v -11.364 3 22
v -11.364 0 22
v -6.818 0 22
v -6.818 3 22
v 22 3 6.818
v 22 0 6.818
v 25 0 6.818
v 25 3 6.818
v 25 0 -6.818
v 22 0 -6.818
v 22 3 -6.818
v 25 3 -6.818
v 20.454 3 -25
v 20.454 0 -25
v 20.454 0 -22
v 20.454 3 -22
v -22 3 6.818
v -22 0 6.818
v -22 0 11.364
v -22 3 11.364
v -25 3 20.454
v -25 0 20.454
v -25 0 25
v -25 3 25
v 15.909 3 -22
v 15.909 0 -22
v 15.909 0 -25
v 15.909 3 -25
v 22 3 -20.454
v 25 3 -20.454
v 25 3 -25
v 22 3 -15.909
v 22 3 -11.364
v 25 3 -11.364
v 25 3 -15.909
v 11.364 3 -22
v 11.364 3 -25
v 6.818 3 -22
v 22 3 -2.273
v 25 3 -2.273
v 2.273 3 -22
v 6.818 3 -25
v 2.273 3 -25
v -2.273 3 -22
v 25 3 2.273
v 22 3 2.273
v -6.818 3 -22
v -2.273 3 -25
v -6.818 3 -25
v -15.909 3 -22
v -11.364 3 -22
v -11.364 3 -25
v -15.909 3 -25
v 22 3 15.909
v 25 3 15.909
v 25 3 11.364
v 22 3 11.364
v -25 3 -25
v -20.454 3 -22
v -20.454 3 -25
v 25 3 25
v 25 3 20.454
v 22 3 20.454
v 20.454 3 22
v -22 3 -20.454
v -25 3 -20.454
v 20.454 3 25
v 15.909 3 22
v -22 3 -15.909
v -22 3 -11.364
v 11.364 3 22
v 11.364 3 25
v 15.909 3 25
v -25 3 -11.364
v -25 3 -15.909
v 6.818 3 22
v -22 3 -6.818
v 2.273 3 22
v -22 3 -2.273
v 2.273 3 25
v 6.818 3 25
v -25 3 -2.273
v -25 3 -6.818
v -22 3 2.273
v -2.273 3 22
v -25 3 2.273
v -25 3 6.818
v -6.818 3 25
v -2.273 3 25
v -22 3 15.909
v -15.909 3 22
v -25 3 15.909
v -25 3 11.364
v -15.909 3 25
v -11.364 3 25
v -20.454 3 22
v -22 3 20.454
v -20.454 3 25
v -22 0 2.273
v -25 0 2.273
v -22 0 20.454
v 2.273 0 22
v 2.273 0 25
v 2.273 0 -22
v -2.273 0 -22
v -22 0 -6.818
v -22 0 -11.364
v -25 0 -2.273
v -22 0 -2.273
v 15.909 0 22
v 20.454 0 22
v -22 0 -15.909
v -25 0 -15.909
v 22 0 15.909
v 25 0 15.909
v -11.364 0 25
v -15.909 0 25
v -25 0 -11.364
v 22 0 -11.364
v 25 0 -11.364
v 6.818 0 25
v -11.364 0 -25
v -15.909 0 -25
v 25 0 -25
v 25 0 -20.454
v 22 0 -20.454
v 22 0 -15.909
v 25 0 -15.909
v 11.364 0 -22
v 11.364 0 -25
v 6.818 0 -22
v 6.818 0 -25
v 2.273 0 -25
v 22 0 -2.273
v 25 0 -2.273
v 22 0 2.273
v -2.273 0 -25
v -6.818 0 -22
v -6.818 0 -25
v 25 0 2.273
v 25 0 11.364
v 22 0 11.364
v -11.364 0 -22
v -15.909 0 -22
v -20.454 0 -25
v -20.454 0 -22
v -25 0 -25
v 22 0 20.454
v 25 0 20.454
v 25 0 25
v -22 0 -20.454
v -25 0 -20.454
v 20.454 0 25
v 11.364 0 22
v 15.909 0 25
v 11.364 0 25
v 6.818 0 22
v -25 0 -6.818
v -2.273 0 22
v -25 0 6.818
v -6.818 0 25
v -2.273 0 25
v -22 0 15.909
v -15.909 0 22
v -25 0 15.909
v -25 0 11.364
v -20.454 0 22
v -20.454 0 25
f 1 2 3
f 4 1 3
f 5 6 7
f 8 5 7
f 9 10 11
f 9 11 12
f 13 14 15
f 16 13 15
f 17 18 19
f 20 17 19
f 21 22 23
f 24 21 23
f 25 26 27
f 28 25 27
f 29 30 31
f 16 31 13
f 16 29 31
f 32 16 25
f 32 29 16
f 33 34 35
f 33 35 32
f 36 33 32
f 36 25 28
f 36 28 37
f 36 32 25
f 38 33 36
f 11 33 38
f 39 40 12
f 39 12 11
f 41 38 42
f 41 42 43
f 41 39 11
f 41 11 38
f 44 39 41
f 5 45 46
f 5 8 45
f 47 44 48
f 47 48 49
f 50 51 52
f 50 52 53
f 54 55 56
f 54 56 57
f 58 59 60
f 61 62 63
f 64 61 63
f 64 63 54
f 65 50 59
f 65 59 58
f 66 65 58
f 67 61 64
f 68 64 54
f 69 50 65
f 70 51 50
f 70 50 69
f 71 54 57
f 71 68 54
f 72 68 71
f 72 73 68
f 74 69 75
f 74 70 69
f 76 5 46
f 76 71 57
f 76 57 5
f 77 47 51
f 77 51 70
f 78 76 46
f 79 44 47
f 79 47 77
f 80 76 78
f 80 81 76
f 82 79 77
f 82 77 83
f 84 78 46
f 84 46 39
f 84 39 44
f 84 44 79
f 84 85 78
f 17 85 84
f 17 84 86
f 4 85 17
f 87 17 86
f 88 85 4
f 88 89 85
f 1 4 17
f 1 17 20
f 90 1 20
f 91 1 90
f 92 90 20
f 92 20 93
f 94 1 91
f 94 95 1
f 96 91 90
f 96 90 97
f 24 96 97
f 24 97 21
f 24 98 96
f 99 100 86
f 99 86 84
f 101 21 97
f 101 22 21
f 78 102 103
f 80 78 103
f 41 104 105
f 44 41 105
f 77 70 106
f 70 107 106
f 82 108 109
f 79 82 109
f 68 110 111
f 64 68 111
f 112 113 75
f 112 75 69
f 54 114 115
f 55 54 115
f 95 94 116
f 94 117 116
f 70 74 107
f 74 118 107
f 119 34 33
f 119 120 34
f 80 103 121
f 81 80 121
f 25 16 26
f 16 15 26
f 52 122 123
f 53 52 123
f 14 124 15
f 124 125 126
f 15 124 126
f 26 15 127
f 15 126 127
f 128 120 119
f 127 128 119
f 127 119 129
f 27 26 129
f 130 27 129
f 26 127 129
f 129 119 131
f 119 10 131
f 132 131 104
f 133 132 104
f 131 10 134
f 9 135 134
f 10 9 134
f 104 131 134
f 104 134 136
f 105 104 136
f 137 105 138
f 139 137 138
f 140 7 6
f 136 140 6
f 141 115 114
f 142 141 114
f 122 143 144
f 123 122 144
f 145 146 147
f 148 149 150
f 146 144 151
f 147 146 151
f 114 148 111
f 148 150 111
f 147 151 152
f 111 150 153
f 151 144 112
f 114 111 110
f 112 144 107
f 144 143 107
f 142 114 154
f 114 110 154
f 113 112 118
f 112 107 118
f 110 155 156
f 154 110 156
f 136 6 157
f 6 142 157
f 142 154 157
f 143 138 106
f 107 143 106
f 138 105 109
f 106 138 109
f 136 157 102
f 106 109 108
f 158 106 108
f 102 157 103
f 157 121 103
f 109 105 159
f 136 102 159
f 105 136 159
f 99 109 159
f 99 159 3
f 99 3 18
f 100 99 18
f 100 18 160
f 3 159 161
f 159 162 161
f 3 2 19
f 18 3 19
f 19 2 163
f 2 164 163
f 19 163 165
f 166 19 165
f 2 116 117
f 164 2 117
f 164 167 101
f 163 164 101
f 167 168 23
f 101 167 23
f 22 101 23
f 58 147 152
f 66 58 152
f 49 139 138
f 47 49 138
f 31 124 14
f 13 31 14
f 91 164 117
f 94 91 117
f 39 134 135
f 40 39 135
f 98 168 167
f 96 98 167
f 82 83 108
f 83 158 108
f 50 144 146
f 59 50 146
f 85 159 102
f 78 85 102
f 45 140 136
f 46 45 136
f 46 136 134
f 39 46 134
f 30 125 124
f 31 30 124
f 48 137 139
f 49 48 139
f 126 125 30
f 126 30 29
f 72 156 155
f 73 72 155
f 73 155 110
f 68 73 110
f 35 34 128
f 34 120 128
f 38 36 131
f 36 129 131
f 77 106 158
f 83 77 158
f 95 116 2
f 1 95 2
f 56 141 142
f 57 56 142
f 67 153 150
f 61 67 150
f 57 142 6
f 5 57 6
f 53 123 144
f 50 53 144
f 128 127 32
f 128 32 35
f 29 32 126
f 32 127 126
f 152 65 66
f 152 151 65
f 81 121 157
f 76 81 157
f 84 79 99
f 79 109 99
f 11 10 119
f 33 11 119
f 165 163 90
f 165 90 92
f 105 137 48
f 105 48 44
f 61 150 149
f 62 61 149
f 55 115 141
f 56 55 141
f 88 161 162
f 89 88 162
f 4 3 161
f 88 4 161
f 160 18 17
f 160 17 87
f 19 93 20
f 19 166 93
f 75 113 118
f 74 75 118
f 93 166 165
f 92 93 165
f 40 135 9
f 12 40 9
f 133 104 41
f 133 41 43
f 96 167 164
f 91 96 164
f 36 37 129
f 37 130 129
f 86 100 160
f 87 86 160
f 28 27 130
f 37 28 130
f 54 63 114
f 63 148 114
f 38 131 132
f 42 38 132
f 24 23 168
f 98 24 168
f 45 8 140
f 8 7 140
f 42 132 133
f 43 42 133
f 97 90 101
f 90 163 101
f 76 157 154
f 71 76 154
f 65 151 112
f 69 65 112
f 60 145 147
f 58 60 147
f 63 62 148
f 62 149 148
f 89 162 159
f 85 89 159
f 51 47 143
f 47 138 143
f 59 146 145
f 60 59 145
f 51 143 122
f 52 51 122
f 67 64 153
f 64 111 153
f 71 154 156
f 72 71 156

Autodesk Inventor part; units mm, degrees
ref_plane "YZ Plane" through (0, 0, 0) normal (1, 0, 0) x (0, 1, 0)
ref_plane "XZ Plane" through (0, 0, 0) normal (0, 1, 0) x (-1, 0, 0)
ref_plane "XY Plane" through (0, 0, 0) normal (0, 0, 1) x (1, 0, 0)
sketch "Sketch1" plane through (0, 0, 0) normal (0, 1, 0) x (-1, 0, 0)
  line L0 (20.4545, 25) -> (20.4545, 22)
  line L1 (15.9091, 22) -> (15.9091, 25)
  line L2 (11.3636, 25) -> (11.3636, 22)
  line L3 (6.8182, 22) -> (6.8182, 25)
  line L4 (2.2727, 25) -> (2.2727, 22)
  line L5 (-2.2727, 22) -> (-2.2727, 25)
  line L6 (-6.8182, 25) -> (-6.8182, 22)
  line L7 (-11.3636, 22) -> (-11.3636, 25)
  line L8 (-15.9091, 25) -> (-15.9091, 22)
  line L9 (-20.4545, 22) -> (-20.4545, 25)
  line L10 (-25, 20.4545) -> (-22, 20.4545)
  line L11 (-22, 15.9091) -> (-25, 15.9091)
  line L12 (-25, 11.3636) -> (-22, 11.3636)
  line L13 (-22, 6.8182) -> (-25, 6.8182)
  line L14 (-25, 2.2727) -> (-22, 2.2727)
  line L15 (-22, -2.2727) -> (-25, -2.2727)
  line L16 (-22, -6.8182) -> (-25, -6.8182)
  line L17 (-25, -11.3636) -> (-22, -11.3636)
  line L18 (-22, -15.9091) -> (-25, -15.9091)
  line L19 (-25, -20.4545) -> (-22, -20.4545)
  line L20 (-20.4545, -25) -> (-20.4545, -22)
  line L21 (-15.9091, -22) -> (-15.9091, -25)
  line L22 (-11.3636, -25) -> (-11.3636, -22)
  line L23 (-6.8182, -22) -> (-6.8182, -25)
  line L24 (-2.2727, -22) -> (-2.2727, -25)
  line L25 (2.2727, -25) -> (2.2727, -22)
  line L26 (20.4545, -22) -> (20.4545, -25)
  line L27 (15.9091, -25) -> (15.9091, -22)
  line L28 (11.3636, -22) -> (11.3636, -25)
  line L29 (6.8182, -25) -> (6.8182, -22)
  line L30 (22, -20.4545) -> (25, -20.4545)
  line L31 (25, -15.9091) -> (22, -15.9091)
  line L32 (25, -11.3636) -> (22, -11.3636)
  line L33 (25, -2.2727) -> (22, -2.2727)
  line L34 (25, 2.2727) -> (22, 2.2727)
  line L35 (25, 20.4545) -> (22, 20.4545)
  line L36 (22, 15.9091) -> (25, 15.9091)
  line L37 (25, 11.3636) -> (22, 11.3636)
  line L38 (22, 6.8182) -> (25, 6.8182)
  line L39 (15.9091, -22) -> (20.4545, -22)
  line L40 (6.8182, -22) -> (11.3636, -22)
  line L41 (-2.2727, -22) -> (2.2727, -22)
  line L42 (22, -20.4545) -> (22, -15.9091)
  line L43 (22, -2.2727) -> (22, 2.2727)
  line L44 (22, 6.8182) -> (22, 11.3636)
  line L45 (22, 15.9091) -> (22, 20.4545)
  line L46 (20.4545, 22) -> (15.9091, 22)
  line L47 (11.3636, 22) -> (6.8182, 22)
  line L48 (2.2727, 22) -> (-2.2727, 22)
  line L49 (-6.8182, 22) -> (-11.3636, 22)
  line L50 (-15.9091, 22) -> (-20.4545, 22)
  line L51 (-22, 20.4545) -> (-22, 15.9091)
  line L52 (-22, 11.3636) -> (-22, 6.8182)
  line L53 (-22, 2.2727) -> (-22, -2.2727)
  line L54 (-25, 6.8182) -> (-25, 2.2727)
  line L55 (-25, 25) -> (-25, 20.4545)
  line L56 (-25, 15.9091) -> (-25, 11.3636)
  line L57 (-20.4545, -22) -> (-15.9091, -22)
  line L58 (-11.3636, -22) -> (-6.8182, -22)
  line L59 (-22, -6.8182) -> (-22, -11.3636)
  line L60 (-22, -15.9091) -> (-22, -20.4545)
  line L61 (-25, -2.2727) -> (-25, -6.8182)
  line L62 (-25, -11.3636) -> (-25, -15.9091)
  line L63 (-25, -20.4545) -> (-25, -25)
  line L64 (-25, -25) -> (-20.4545, -25)
  line L65 (-15.9091, -25) -> (-11.3636, -25)
  line L66 (-6.8182, -25) -> (-2.2727, -25)
  line L67 (2.2727, -25) -> (6.8182, -25)
  line L68 (11.3636, -25) -> (15.9091, -25)
  line L69 (20.4545, -25) -> (25, -25)
  line L70 (25, -25) -> (25, -20.4545)
  line L71 (25, 2.2727) -> (25, 6.8182)
  line L72 (25, 11.3636) -> (25, 15.9091)
  line L73 (25, 20.4545) -> (25, 25)
  line L74 (25, 25) -> (20.4545, 25)
  line L75 (15.9091, 25) -> (11.3636, 25)
  line L76 (6.8182, 25) -> (2.2727, 25)
  line L77 (-2.2727, 25) -> (-6.8182, 25)
  line L78 (-11.3636, 25) -> (-15.9091, 25)
  line L79 (-20.4545, 25) -> (-25, 25)
  line L80 (22, -11.3636) -> (22, -6.8182)
  line L81 (22, -6.8182) -> (25, -6.8182)
  line L82 (25, -15.9091) -> (25, -11.3636)
  line L83 (25, -6.8182) -> (25, -2.2727)
  point P0 (0, 0)
  dimension "d1" = 50
  dimension "d3" = 50
  dimension "d5" = 25
  dimension "d6" = 25
  dimension "d7" = 3
  dimension "d8" = 3
  dimension "d9" = 3
  dimension "d10" = 3
  dimension "d15" = 4.5454
extrude "Extrusion1" add sketch "Sketch1" along normal blind 3
equation "\"d1\" = wt"
equation "\"d3\" = lt"
equation "\"d5\" = 0.5 * lt"
equation "\"d6\" = 0.5 * wt"
equation "\"d7\" = tt"
equation "\"d8\" = tt"
equation "\"d9\" = tt"
equation "\"d10\" = tt"
equation "\"d13\" = tt"
equation "\"wt\" = 50"
equation "\"tt\" = 3"
equation "\"tol\" = 0"
equation "\"tiroir\" = 25.4"
equation "\"nHoles\" = 101.6"
equation "\"shelfH\" = 35"
equation "\"d0\" = 0.5 * wt"
equation "\"d2\" = 0.5 * lt"
equation "\"lt\" = 50"
equation "\"d4\" = tt"
properties part number "base"
